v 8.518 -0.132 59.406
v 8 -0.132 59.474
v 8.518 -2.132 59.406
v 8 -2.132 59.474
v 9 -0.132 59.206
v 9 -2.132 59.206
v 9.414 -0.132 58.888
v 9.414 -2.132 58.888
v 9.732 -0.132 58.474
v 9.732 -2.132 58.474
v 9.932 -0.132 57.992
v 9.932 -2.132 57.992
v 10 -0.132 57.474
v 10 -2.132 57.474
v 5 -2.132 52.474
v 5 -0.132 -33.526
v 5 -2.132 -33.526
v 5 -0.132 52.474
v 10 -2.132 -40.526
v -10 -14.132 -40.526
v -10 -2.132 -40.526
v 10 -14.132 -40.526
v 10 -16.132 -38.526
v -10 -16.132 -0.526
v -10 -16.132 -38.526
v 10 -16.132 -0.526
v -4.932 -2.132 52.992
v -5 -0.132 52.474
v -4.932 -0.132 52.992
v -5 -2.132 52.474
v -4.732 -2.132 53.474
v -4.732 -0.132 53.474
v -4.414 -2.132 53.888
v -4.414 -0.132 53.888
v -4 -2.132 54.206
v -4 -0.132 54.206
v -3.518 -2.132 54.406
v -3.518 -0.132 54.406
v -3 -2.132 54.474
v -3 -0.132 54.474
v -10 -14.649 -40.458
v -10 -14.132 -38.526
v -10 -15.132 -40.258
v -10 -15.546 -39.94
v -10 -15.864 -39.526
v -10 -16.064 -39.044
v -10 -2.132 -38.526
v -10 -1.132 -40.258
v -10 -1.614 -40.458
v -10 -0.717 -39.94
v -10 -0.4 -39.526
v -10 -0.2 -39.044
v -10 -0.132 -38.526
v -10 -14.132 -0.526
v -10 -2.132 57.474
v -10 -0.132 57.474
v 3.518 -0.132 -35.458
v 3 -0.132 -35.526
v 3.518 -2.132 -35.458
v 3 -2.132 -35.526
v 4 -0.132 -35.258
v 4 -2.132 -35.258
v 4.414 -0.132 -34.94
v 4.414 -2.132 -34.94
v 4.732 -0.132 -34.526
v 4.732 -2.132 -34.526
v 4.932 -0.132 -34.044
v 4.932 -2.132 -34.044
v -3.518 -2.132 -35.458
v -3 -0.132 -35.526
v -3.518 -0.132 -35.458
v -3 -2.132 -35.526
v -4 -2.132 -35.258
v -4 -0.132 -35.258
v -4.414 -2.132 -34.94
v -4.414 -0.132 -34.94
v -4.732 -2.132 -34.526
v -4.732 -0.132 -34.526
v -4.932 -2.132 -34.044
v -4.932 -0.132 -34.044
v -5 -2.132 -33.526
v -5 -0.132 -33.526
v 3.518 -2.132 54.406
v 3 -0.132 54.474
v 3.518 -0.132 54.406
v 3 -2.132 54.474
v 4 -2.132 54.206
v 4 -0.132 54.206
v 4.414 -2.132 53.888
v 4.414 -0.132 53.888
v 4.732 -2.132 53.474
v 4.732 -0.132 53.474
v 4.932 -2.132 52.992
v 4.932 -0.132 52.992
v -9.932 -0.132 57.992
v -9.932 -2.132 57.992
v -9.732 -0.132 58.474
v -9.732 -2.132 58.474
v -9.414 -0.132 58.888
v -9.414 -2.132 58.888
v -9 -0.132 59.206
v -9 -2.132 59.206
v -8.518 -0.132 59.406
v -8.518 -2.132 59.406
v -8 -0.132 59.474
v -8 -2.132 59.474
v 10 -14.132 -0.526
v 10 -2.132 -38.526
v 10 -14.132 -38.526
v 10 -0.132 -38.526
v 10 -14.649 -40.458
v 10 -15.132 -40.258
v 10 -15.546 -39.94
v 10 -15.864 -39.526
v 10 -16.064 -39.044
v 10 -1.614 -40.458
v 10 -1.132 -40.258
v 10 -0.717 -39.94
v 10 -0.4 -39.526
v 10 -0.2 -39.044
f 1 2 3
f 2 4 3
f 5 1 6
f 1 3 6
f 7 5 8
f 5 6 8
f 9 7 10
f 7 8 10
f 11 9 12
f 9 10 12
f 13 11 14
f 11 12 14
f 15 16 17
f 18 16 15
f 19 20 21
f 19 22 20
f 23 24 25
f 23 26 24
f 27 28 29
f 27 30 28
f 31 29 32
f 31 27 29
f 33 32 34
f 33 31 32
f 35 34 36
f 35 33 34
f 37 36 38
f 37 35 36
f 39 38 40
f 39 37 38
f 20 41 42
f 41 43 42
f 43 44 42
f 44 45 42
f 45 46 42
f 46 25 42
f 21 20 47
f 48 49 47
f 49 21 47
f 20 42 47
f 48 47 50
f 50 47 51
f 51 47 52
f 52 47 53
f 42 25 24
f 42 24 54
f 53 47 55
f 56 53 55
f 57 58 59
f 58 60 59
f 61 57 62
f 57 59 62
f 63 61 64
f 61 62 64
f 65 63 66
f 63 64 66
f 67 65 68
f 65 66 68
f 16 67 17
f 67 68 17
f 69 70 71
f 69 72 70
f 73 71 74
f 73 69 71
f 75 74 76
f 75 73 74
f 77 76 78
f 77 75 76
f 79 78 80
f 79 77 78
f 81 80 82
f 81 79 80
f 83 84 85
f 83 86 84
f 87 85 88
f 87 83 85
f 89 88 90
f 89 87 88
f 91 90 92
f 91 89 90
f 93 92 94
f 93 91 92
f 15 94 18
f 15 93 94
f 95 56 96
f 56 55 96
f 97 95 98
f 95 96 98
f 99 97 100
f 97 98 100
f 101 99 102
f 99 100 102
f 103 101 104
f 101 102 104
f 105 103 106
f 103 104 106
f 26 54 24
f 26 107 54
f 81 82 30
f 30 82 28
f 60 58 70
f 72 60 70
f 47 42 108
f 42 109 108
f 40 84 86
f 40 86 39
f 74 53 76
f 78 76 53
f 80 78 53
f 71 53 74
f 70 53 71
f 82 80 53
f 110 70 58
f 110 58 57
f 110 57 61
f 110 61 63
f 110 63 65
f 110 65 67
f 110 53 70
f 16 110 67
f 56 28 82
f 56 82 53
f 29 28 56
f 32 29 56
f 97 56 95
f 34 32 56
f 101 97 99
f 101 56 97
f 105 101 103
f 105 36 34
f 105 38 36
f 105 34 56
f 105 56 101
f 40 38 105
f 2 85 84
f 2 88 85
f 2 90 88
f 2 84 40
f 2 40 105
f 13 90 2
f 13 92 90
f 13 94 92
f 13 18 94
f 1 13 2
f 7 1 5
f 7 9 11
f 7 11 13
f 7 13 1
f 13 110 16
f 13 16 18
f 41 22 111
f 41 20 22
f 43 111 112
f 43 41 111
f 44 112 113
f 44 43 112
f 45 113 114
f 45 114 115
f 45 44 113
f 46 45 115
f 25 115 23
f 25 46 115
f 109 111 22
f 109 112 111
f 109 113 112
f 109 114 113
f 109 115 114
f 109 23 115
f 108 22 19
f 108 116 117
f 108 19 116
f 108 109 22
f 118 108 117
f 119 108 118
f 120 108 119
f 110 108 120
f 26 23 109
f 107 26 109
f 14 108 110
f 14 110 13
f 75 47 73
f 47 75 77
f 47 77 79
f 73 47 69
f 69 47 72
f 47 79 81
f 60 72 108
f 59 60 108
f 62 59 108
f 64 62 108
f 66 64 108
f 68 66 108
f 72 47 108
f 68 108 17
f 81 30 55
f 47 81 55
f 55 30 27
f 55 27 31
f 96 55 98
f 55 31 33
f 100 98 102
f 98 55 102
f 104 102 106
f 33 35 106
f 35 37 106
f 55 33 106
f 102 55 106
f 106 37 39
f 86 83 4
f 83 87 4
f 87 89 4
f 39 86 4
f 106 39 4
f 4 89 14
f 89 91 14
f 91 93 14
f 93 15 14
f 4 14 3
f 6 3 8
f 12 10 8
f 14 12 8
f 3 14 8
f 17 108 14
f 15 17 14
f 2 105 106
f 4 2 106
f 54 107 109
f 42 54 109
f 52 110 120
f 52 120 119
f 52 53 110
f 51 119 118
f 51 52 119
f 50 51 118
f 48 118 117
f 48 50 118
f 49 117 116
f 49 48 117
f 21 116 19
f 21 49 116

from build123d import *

# Parameters (mm, degrees)
F1_DEPTH = 10
F2_T     = -2
F3_W     = 10
F3_H     = 90
F4_DEPTH = 2
F5_R     = 2


with BuildPart() as f1:
    # F0 (on Right) → F1 (new body, symmetric)
    with BuildSketch(Plane.YZ):
        Polygon((-0.131682, 59.474063), (-10.131682, 59.474063), (-10.131682, -0.525937), (-16.131682, -0.525937), (-16.131682, -40.525937), (-0.131682, -40.525937), align=None)
    extrude(amount=F1_DEPTH, both=True)

    # F2
    f2_openings = [f1.faces().sort_by_distance(p)[0] for p in [
        (0, -13.131682, -0.525937),
        (0, -10.131682, 29.474063),
        (0, -5.131682, 59.474063),
        (10, -6.680069, 3.667611),
        (-10, -6.680069, 3.667611),
    ]]
    offset(amount=F2_T, openings=f2_openings)

    # F3 (on face) → F4 (cut)
    with BuildSketch(Plane(origin=(0, -0.131682, 0), x_dir=(-1, 0, 0), z_dir=(0, 1, 0))):
        with Locations((0, 9.474063)):
            Rectangle(F3_W, F3_H)
    extrude(amount=-F4_DEPTH, mode=Mode.SUBTRACT)

    # F5
    f5_edges = [f1.edges().sort_by_distance(p)[0] for p in [
        (10, -1.131682, 59.474063),
        (-10, -1.131682, 59.474063),
        (-5, -1.131682, 54.474063),
        (5, -1.131682, 54.474063),
        (0, -0.131682, -40.525937),
        (0, -16.131682, -40.525937),
        (-5, -1.131682, -35.525937),
        (5, -1.131682, -35.525937),
    ]]
    fillet(f5_edges, radius=F5_R)


solid = f1.part
